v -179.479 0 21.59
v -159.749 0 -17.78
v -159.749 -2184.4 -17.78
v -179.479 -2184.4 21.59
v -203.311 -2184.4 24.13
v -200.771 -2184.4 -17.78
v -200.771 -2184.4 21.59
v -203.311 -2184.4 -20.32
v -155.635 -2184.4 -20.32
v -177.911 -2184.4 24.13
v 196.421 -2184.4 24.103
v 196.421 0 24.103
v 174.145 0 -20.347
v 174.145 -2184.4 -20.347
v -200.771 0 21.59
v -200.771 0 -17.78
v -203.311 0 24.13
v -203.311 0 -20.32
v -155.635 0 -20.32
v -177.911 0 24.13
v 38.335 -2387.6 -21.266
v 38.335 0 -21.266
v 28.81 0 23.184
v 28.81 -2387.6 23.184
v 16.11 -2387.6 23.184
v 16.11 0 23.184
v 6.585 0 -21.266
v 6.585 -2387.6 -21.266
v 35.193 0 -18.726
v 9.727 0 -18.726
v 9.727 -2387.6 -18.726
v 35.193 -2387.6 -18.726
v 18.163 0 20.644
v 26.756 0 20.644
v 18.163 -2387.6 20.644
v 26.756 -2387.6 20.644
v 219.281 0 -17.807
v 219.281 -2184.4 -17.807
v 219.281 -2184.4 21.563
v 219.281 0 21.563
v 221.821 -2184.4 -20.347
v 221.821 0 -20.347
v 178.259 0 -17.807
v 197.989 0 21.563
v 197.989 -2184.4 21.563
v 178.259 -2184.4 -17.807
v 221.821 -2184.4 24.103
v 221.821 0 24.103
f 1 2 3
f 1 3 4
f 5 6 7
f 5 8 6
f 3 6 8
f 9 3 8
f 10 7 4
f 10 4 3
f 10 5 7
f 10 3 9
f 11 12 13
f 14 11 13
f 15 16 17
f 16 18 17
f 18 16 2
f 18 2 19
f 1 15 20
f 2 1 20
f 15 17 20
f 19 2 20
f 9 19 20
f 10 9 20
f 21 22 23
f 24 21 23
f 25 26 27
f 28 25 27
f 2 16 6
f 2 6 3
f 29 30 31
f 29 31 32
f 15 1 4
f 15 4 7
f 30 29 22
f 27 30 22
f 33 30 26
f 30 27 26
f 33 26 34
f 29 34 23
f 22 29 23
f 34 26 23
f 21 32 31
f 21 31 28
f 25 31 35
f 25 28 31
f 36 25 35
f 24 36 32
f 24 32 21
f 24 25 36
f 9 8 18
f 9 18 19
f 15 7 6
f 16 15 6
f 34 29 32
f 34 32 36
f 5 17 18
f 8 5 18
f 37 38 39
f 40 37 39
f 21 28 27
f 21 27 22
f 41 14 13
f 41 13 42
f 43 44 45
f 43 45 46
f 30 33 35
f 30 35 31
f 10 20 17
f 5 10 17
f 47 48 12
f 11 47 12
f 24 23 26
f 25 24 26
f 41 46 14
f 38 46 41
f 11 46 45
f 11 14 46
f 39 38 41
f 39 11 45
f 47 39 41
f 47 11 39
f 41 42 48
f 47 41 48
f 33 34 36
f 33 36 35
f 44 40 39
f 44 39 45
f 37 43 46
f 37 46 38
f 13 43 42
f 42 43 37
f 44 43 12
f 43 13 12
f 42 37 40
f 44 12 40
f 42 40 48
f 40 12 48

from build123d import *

# Parameters (mm, degrees)
F1_DEPTH = 2184.4
F2_T     = -2.54
F5_DEPTH = 2387.6
F6_T     = -2.54
F7_DEPTH = 2184.4
F8_T     = -2.54


with BuildPart() as f1:
    # F0 (on Front) → F1 (new body)
    with BuildSketch(Plane.XZ):
        Polygon((-177.910953, 24.129806), (-203.310953, 24.129806), (-203.310953, -20.320194), (-177.646502, -20.320194), (-155.634962, -20.320194), align=None)
    extrude(amount=F1_DEPTH)

    # F2
    f2_openings = [f1.faces().sort_by_distance(p)[0] for p in [
        (-184.476083, -2184.4, -0.3535),
        (-184.476083, 0, -0.3535),
    ]]
    offset(amount=F2_T, openings=f2_openings)


with BuildPart() as f5:
    # F3 (on Front) → F5 (new body)
    with BuildSketch(Plane.XZ):
        Polygon((16.109681, 23.184116), (6.584681, -21.265884), (38.334681, -21.265884), (28.809681, 23.184116), align=None)
    extrude(amount=F5_DEPTH)

    # F6
    f6_openings = [f5.faces().sort_by_distance(p)[0] for p in [
        (22.459681, 0, -2.215884),
        (22.459681, -2387.6, -2.215884),
    ]]
    offset(amount=F6_T, openings=f6_openings)


with BuildPart() as f7:
    # F4 (on Front) → F7 (new body)
    with BuildSketch(Plane.XZ):
        Polygon((221.82103, -20.347234), (221.82103, 24.102766), (196.42103, 24.102766), (174.145039, -20.347234), align=None)
    extrude(amount=F7_DEPTH)

    # F8
    f8_openings = [f7.faces().sort_by_distance(p)[0] for p in [
        (202.98616, -2184.4, -0.380541),
        (202.98616, 0, -0.380541),
    ]]
    offset(amount=F8_T, openings=f8_openings)


solid = Compound([f1.part, f5.part, f7.part])
